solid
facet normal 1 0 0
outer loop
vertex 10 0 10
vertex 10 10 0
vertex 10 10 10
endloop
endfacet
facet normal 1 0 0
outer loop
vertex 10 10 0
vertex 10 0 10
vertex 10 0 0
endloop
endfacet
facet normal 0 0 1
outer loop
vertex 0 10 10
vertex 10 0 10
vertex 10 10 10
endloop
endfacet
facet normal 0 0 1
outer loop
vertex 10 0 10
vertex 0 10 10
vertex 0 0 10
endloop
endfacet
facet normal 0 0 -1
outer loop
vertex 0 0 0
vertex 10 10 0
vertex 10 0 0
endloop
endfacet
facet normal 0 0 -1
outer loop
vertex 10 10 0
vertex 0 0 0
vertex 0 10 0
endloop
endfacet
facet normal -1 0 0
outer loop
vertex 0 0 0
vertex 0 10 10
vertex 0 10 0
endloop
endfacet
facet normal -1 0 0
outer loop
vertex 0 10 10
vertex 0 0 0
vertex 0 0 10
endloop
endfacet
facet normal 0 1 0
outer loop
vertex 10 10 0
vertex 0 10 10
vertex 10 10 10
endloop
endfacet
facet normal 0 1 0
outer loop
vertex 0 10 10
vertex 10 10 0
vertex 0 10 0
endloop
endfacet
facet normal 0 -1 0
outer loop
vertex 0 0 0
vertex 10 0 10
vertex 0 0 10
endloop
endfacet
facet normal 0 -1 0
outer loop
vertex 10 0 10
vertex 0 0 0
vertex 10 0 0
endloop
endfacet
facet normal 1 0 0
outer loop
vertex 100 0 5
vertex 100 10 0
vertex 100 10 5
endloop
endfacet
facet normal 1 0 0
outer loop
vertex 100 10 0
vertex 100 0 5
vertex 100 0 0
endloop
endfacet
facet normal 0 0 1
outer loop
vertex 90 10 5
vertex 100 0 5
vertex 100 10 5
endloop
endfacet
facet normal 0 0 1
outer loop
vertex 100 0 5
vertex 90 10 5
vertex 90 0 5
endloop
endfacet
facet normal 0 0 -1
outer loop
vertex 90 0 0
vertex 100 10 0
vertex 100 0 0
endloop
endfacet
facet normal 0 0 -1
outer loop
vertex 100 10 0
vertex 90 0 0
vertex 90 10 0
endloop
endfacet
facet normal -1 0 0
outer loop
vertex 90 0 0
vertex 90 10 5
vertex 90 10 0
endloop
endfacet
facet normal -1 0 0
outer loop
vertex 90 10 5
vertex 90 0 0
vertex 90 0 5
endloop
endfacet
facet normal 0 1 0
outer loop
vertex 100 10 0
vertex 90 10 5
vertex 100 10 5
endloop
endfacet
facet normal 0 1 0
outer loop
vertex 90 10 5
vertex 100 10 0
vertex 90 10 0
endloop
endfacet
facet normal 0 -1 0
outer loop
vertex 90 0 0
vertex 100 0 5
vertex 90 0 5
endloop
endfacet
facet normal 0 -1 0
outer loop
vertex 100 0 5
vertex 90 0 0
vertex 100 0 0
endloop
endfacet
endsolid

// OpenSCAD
// REFERENCE — FarmRTK single-file parametric mount pattern
// New parts: use templates/part.scad + init_cad_part.ps1
// Params live at top inside // [FarmRTK PARAMS BEGIN/END] — synced from <PartId>.md

// [FarmRTK PARAMS BEGIN]
/* [Export] */
PART = "all"; // [all, base, bezel, proxy]
/* [Visibility] */
SHOW_BASE = true;
SHOW_BEZEL = true;
SHOW_PCB_PROXY = false;
/* [Dimensions] */
pcb_w = 86.0;
pcb_h = 50.0;
pcb_thickness = 3.2;
touch_clearance_mm = 0.7;
// [FarmRTK PARAMS END]

$fn = 48;

module render_part() {
    if (PART == "base" || PART == "all") if (SHOW_BASE) children(0);
    if (PART == "bezel" || PART == "all") if (SHOW_BEZEL) translate([90,0,0]) children(1);
    if (PART == "proxy" || PART == "all") if (SHOW_PCB_PROXY) translate([0,60,0]) children(2);
}

render_part() {
    color("RoyalBlue") cube([10,10,10]);
    color("Orange") cube([10,10,5]);
    color("DimGray", 0.4) cube([pcb_w, pcb_h, pcb_thickness]);
}

echo(str("FarmRTK reference — PART=", PART, " pcb=", pcb_w, "x", pcb_h));
